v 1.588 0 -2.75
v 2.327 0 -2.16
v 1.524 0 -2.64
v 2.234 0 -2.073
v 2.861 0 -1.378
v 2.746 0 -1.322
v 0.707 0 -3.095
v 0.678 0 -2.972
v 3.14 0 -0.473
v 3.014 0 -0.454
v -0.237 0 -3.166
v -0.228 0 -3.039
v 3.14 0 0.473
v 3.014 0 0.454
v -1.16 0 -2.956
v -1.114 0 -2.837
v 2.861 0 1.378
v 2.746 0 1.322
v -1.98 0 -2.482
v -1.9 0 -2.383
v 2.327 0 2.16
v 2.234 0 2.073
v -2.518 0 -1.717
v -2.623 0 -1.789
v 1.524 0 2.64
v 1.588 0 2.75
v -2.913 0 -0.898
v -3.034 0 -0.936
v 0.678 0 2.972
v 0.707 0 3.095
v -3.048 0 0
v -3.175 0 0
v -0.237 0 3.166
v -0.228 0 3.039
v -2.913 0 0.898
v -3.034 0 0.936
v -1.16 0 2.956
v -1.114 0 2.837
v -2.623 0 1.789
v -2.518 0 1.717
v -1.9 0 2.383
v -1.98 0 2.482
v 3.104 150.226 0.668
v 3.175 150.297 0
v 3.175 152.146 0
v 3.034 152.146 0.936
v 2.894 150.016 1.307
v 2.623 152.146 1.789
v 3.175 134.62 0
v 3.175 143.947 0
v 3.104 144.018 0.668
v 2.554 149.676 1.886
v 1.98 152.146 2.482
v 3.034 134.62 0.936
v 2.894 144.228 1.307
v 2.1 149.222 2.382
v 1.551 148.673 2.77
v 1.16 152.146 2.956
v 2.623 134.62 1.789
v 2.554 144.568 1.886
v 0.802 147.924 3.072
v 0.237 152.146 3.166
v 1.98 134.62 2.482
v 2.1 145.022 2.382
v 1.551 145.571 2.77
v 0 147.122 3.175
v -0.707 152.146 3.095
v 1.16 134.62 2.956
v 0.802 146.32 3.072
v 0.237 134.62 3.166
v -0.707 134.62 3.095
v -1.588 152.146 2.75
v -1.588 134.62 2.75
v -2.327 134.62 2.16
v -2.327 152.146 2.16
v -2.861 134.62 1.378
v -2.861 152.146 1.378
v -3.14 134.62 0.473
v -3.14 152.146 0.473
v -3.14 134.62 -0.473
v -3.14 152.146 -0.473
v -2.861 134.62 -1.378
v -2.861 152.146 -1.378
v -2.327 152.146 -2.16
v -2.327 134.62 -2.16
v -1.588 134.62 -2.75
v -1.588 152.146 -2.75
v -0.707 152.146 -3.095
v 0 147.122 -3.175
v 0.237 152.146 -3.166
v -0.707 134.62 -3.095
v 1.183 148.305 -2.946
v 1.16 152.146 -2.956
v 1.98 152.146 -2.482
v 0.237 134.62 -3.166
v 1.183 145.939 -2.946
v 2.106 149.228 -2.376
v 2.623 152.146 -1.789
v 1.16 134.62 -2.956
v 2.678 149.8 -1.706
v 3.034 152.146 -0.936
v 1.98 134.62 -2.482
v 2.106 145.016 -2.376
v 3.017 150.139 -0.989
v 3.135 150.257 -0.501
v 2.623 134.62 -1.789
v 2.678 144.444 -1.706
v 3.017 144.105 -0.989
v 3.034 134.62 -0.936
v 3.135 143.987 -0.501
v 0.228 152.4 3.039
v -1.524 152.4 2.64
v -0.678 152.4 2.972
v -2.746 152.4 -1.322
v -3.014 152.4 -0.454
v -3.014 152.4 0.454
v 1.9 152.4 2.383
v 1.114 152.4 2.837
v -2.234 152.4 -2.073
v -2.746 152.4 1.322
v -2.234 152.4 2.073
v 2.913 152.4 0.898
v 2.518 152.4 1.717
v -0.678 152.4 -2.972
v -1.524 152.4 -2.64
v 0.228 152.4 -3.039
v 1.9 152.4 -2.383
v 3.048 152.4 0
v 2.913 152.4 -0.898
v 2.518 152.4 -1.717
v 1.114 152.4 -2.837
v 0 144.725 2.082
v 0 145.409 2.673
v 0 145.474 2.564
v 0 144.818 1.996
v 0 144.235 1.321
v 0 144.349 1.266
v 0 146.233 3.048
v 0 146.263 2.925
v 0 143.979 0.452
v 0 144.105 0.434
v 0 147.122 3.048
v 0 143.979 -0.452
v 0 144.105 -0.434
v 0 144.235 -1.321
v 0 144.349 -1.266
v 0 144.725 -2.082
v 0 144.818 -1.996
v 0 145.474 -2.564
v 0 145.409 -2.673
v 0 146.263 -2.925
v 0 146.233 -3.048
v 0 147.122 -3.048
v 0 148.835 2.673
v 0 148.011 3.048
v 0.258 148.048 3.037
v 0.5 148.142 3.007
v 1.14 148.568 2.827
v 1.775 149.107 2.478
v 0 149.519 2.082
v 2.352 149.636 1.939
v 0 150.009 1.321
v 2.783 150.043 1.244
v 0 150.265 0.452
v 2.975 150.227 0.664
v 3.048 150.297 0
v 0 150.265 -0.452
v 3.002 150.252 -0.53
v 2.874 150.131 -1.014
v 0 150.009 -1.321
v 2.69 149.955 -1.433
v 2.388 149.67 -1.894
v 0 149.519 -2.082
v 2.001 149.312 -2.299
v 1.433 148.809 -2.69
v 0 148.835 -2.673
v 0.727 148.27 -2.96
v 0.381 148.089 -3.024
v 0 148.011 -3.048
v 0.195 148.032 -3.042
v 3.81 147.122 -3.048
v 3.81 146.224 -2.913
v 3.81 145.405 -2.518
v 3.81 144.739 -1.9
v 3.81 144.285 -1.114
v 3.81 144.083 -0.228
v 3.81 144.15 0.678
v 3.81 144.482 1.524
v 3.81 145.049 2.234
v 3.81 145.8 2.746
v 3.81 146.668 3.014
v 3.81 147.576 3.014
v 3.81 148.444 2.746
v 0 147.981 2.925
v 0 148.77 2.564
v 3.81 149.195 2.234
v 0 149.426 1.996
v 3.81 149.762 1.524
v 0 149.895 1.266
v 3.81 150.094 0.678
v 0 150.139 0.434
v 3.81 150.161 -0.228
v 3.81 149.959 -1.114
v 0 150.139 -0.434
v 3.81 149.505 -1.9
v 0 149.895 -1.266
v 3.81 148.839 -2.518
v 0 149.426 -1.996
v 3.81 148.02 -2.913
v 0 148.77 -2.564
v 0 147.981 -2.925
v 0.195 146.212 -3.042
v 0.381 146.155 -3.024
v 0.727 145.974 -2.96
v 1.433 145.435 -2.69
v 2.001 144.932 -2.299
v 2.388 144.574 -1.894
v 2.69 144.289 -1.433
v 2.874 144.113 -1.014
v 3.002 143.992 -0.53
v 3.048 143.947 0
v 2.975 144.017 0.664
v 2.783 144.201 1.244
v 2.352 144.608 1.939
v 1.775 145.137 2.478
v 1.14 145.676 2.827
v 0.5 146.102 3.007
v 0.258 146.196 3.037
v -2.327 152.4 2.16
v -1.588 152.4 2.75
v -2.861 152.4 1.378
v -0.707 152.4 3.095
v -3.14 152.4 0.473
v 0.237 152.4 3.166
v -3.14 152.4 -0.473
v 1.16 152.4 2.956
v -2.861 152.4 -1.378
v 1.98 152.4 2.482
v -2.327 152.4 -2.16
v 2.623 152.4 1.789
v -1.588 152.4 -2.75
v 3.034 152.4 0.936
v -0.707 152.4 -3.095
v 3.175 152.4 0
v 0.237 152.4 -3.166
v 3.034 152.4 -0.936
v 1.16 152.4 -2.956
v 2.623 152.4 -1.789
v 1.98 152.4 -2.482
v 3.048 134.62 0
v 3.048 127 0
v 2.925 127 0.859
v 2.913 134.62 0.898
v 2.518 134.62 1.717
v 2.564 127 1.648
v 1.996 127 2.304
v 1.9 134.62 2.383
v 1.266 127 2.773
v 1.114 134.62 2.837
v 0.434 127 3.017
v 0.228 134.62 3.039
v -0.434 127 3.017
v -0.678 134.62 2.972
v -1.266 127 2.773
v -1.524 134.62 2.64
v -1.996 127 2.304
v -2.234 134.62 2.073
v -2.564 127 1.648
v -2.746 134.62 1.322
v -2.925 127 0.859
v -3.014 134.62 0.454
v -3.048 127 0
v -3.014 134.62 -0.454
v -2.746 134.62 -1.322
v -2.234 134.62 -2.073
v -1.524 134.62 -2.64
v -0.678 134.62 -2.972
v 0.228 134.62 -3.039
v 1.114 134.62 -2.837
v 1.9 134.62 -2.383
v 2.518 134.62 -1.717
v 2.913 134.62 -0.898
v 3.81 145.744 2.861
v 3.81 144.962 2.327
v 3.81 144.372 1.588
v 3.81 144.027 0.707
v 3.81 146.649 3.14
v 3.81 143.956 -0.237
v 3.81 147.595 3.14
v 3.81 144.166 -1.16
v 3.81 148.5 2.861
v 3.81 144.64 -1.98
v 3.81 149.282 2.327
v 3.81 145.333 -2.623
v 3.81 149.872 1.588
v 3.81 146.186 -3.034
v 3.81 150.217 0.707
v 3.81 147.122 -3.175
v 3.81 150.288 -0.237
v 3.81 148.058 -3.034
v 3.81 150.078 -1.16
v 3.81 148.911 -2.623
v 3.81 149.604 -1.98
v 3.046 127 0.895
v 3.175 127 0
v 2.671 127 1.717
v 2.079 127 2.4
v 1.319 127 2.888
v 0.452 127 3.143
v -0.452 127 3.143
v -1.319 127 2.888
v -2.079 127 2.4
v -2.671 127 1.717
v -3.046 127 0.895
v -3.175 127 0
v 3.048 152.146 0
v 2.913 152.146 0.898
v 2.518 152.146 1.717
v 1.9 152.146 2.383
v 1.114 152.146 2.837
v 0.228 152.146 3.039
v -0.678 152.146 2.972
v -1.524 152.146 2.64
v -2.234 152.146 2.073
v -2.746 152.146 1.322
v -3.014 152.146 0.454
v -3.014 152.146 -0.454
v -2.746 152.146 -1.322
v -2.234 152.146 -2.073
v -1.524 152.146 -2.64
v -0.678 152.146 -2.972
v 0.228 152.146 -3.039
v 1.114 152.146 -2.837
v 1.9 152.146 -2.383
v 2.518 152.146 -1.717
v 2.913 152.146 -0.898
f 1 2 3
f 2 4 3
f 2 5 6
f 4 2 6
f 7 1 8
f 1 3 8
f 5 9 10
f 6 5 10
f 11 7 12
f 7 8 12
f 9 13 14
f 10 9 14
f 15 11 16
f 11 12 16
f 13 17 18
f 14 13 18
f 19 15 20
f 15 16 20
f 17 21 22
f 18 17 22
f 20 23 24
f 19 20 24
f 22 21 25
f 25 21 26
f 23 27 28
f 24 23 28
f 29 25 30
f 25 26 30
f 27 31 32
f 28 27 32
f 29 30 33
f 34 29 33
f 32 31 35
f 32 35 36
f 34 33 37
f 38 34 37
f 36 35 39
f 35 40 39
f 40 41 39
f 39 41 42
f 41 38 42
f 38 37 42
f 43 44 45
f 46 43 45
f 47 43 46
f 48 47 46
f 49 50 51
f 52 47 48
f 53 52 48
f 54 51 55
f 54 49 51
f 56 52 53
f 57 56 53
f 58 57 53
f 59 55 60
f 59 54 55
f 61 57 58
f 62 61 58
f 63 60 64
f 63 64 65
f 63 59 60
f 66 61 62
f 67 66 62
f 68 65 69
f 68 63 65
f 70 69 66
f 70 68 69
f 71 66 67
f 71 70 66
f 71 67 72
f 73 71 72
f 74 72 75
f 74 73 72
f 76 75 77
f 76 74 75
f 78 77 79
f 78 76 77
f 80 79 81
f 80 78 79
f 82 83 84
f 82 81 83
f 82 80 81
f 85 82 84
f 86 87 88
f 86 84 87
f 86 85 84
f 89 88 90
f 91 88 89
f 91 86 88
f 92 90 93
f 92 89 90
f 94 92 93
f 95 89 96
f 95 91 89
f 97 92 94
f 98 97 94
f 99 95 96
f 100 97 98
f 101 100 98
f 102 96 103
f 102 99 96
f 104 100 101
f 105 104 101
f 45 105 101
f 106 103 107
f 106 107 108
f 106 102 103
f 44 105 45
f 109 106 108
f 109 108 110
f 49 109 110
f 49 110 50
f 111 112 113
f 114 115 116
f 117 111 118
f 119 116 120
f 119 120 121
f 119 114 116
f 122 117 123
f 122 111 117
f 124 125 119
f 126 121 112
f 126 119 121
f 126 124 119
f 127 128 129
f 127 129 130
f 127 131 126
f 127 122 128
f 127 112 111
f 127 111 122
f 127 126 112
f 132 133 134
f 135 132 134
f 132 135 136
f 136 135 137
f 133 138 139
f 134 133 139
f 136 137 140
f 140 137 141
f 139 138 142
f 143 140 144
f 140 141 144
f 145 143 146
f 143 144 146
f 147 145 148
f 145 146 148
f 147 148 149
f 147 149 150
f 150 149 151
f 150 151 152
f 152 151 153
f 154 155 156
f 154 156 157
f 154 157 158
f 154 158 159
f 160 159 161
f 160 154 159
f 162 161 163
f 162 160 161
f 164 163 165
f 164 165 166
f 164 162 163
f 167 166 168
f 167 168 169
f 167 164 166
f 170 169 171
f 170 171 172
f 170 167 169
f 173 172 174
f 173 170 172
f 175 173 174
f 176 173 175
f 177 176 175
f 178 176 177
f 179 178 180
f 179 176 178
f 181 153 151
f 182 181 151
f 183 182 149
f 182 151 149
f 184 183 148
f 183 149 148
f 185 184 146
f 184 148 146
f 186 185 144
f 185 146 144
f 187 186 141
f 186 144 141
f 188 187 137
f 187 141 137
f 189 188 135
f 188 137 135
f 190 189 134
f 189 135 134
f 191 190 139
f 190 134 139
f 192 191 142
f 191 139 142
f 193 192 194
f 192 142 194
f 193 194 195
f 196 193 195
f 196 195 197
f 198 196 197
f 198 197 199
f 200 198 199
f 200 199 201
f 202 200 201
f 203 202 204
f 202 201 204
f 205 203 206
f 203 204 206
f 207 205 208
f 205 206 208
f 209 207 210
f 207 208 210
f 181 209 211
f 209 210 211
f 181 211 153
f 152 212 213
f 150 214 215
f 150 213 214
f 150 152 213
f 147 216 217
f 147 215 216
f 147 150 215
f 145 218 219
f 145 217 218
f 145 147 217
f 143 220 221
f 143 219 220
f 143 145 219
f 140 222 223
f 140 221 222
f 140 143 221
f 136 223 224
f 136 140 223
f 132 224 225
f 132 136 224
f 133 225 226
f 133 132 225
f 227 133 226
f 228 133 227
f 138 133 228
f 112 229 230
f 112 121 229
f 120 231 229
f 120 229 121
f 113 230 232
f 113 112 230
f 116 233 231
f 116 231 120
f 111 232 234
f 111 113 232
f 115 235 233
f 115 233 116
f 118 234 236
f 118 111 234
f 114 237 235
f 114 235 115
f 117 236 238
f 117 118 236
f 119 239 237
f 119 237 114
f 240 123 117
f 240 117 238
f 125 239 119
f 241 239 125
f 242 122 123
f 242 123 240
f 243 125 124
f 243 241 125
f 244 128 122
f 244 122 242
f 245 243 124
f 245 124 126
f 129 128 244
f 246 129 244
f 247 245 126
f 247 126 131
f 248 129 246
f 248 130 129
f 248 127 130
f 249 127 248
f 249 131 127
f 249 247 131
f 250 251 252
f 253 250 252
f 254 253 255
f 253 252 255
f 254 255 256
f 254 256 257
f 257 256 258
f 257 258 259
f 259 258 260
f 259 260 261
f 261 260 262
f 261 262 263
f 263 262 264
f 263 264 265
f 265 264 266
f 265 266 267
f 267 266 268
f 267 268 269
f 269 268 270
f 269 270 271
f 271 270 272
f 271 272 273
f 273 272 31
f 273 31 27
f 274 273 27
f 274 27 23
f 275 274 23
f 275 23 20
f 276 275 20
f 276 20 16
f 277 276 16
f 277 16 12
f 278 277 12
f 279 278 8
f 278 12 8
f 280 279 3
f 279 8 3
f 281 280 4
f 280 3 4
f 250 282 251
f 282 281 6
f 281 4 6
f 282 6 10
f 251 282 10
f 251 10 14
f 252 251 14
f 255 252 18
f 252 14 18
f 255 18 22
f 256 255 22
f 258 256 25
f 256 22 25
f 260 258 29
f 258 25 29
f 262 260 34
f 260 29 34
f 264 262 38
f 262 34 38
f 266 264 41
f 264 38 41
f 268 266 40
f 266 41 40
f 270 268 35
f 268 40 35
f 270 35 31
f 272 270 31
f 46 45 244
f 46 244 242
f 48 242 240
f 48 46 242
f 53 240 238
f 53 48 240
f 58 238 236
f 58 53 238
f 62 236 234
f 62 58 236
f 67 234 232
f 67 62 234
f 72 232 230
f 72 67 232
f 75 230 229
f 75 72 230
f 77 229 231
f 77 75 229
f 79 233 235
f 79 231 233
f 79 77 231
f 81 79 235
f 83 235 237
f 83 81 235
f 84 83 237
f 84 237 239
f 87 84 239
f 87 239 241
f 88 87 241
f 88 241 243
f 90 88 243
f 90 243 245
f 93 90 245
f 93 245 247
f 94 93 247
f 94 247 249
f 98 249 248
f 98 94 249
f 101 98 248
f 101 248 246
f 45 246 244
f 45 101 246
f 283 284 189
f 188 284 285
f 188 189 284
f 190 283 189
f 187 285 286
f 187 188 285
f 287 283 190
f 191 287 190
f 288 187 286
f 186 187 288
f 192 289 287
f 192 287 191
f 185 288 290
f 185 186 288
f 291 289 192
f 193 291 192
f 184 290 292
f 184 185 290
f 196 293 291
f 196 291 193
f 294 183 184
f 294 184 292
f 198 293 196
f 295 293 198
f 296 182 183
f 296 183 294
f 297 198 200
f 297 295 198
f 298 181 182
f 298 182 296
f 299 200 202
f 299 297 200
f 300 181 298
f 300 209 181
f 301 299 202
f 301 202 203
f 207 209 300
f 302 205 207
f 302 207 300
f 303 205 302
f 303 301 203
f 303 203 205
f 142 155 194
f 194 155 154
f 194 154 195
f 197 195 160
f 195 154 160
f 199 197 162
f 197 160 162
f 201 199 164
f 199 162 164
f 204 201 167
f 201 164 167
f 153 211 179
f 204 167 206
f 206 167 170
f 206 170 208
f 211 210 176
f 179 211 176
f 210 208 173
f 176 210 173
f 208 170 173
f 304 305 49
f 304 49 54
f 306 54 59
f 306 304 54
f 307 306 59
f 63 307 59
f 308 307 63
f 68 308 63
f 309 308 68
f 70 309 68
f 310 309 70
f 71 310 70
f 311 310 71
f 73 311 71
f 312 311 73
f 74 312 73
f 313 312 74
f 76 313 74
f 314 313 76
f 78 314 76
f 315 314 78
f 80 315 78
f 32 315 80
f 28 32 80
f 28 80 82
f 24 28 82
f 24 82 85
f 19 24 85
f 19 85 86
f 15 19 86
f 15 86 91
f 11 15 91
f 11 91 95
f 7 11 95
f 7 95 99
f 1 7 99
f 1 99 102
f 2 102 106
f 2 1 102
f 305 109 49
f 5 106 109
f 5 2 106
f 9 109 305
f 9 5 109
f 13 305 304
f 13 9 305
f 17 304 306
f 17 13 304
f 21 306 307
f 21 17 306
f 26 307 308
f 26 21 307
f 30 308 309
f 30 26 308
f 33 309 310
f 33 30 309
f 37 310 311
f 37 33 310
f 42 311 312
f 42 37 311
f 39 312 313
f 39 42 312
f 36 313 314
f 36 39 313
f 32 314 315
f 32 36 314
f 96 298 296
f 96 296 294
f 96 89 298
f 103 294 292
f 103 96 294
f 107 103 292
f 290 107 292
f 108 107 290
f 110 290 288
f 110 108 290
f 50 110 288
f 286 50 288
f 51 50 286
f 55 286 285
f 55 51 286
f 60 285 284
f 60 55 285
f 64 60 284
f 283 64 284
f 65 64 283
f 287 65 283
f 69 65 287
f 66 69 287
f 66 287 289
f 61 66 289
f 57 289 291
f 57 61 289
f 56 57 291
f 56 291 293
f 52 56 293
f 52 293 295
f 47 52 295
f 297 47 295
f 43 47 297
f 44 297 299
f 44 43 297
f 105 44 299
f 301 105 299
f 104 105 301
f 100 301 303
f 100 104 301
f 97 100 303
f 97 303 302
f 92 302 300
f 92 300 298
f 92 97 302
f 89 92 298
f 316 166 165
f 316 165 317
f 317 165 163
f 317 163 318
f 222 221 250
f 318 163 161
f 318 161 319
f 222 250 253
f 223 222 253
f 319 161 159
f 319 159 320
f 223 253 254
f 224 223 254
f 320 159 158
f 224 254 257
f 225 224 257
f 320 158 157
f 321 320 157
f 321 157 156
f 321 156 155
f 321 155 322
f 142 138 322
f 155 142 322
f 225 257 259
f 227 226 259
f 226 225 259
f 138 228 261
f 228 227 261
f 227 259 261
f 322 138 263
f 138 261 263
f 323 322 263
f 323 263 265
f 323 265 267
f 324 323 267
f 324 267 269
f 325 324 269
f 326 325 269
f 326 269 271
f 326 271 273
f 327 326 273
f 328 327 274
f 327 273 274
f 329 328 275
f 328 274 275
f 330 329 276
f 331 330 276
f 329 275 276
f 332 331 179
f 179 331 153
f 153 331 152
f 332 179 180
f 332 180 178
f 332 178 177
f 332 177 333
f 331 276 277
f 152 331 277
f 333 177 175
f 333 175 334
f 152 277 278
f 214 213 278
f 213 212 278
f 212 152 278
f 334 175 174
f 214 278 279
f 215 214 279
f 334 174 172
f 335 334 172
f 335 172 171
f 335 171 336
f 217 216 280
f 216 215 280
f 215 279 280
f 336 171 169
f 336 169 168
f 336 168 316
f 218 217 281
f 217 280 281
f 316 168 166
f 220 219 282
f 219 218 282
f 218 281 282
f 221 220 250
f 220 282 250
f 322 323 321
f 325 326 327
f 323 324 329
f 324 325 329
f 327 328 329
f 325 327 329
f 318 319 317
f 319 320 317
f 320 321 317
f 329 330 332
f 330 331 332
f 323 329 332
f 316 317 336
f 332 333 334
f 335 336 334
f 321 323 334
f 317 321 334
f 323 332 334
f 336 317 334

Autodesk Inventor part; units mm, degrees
ref_plane "XZ Plane" through (0, 0, 0) normal (0, 1, 0) x (-1, 0, 0)
ref_plane "XY Plane" through (0, 0, 0) normal (0, 0, 1) x (1, 0, 0)
sketch "Sketch1" plane through (0, 0, 0) normal (0, 1, 0) x (-1, 0, 0)
  circle A0 centre (0, 0) radius 3.175
  circle A1 centre (0, 0) radius 3.048
  dimension "d0" = 6.35
  dimension "d1" = 6.096
extrude "Extrusion1" add sketch "Sketch1" along normal blind 127
sketch "Sketch8" plane through (0, 127, 0) normal (0, 1, 0) x (1, 0, 0)
  circle A0 centre (0, 0) radius 3.175 projected
  circle A1 centre (0, 0) radius 3.048 projected
extrude "Extrusion2" add sketch "Sketch8" along normal blind 7.62
sketch "Sketch16" plane through (0, 134.62, 0) normal (0, 1, 0) x (1, 0, 0)
  circle A0 centre (0, 0) radius 3.175 projected
  circle A1 centre (0, 0) radius 3.048 projected
extrude "Extrusion3" add sketch "Sketch16" along normal blind 17.78
sketch "Sketch17" plane through (0, 152.4, 0) normal (0, 1, 0) x (1, 0, 0)
  circle A0 centre (0, 0) radius 3.175 projected
extrude "Extrusion4" add sketch "Sketch17" against normal blind 0.254
ref_plane "Work Plane2" through (12.7, 0, 0) normal (1, 0, 0) x (0, 1, 0)
sketch "Sketch18" plane through (12.7, 0, 0) normal (1, 0, 0) x (0, 1, 0)
  circle A0 centre (147.122, 0) radius 3.175
  point P0 (0, 0)
  dimension "d58" = 6.35
extrude "Extrusion5" cut sketch "Sketch18" against normal blind 12.7
sketch "Sketch19" plane through (0, 0, 0) normal (1, 0, 0) x (0, 0, -1)
  arc A0 (-3.175, 147.122) -> (3.175, 147.122) centre (0, 147.122) ccw projected
  circle A1 centre (0, 147.122) radius 3.175
  circle A2 centre (0, 147.122) radius 3.048
  point P0 (0, 0)
  dimension "d61" = 6.096
extrude "Extrusion6" add sketch "Sketch19" along normal blind 3.81
properties part number "waterpip2e"
